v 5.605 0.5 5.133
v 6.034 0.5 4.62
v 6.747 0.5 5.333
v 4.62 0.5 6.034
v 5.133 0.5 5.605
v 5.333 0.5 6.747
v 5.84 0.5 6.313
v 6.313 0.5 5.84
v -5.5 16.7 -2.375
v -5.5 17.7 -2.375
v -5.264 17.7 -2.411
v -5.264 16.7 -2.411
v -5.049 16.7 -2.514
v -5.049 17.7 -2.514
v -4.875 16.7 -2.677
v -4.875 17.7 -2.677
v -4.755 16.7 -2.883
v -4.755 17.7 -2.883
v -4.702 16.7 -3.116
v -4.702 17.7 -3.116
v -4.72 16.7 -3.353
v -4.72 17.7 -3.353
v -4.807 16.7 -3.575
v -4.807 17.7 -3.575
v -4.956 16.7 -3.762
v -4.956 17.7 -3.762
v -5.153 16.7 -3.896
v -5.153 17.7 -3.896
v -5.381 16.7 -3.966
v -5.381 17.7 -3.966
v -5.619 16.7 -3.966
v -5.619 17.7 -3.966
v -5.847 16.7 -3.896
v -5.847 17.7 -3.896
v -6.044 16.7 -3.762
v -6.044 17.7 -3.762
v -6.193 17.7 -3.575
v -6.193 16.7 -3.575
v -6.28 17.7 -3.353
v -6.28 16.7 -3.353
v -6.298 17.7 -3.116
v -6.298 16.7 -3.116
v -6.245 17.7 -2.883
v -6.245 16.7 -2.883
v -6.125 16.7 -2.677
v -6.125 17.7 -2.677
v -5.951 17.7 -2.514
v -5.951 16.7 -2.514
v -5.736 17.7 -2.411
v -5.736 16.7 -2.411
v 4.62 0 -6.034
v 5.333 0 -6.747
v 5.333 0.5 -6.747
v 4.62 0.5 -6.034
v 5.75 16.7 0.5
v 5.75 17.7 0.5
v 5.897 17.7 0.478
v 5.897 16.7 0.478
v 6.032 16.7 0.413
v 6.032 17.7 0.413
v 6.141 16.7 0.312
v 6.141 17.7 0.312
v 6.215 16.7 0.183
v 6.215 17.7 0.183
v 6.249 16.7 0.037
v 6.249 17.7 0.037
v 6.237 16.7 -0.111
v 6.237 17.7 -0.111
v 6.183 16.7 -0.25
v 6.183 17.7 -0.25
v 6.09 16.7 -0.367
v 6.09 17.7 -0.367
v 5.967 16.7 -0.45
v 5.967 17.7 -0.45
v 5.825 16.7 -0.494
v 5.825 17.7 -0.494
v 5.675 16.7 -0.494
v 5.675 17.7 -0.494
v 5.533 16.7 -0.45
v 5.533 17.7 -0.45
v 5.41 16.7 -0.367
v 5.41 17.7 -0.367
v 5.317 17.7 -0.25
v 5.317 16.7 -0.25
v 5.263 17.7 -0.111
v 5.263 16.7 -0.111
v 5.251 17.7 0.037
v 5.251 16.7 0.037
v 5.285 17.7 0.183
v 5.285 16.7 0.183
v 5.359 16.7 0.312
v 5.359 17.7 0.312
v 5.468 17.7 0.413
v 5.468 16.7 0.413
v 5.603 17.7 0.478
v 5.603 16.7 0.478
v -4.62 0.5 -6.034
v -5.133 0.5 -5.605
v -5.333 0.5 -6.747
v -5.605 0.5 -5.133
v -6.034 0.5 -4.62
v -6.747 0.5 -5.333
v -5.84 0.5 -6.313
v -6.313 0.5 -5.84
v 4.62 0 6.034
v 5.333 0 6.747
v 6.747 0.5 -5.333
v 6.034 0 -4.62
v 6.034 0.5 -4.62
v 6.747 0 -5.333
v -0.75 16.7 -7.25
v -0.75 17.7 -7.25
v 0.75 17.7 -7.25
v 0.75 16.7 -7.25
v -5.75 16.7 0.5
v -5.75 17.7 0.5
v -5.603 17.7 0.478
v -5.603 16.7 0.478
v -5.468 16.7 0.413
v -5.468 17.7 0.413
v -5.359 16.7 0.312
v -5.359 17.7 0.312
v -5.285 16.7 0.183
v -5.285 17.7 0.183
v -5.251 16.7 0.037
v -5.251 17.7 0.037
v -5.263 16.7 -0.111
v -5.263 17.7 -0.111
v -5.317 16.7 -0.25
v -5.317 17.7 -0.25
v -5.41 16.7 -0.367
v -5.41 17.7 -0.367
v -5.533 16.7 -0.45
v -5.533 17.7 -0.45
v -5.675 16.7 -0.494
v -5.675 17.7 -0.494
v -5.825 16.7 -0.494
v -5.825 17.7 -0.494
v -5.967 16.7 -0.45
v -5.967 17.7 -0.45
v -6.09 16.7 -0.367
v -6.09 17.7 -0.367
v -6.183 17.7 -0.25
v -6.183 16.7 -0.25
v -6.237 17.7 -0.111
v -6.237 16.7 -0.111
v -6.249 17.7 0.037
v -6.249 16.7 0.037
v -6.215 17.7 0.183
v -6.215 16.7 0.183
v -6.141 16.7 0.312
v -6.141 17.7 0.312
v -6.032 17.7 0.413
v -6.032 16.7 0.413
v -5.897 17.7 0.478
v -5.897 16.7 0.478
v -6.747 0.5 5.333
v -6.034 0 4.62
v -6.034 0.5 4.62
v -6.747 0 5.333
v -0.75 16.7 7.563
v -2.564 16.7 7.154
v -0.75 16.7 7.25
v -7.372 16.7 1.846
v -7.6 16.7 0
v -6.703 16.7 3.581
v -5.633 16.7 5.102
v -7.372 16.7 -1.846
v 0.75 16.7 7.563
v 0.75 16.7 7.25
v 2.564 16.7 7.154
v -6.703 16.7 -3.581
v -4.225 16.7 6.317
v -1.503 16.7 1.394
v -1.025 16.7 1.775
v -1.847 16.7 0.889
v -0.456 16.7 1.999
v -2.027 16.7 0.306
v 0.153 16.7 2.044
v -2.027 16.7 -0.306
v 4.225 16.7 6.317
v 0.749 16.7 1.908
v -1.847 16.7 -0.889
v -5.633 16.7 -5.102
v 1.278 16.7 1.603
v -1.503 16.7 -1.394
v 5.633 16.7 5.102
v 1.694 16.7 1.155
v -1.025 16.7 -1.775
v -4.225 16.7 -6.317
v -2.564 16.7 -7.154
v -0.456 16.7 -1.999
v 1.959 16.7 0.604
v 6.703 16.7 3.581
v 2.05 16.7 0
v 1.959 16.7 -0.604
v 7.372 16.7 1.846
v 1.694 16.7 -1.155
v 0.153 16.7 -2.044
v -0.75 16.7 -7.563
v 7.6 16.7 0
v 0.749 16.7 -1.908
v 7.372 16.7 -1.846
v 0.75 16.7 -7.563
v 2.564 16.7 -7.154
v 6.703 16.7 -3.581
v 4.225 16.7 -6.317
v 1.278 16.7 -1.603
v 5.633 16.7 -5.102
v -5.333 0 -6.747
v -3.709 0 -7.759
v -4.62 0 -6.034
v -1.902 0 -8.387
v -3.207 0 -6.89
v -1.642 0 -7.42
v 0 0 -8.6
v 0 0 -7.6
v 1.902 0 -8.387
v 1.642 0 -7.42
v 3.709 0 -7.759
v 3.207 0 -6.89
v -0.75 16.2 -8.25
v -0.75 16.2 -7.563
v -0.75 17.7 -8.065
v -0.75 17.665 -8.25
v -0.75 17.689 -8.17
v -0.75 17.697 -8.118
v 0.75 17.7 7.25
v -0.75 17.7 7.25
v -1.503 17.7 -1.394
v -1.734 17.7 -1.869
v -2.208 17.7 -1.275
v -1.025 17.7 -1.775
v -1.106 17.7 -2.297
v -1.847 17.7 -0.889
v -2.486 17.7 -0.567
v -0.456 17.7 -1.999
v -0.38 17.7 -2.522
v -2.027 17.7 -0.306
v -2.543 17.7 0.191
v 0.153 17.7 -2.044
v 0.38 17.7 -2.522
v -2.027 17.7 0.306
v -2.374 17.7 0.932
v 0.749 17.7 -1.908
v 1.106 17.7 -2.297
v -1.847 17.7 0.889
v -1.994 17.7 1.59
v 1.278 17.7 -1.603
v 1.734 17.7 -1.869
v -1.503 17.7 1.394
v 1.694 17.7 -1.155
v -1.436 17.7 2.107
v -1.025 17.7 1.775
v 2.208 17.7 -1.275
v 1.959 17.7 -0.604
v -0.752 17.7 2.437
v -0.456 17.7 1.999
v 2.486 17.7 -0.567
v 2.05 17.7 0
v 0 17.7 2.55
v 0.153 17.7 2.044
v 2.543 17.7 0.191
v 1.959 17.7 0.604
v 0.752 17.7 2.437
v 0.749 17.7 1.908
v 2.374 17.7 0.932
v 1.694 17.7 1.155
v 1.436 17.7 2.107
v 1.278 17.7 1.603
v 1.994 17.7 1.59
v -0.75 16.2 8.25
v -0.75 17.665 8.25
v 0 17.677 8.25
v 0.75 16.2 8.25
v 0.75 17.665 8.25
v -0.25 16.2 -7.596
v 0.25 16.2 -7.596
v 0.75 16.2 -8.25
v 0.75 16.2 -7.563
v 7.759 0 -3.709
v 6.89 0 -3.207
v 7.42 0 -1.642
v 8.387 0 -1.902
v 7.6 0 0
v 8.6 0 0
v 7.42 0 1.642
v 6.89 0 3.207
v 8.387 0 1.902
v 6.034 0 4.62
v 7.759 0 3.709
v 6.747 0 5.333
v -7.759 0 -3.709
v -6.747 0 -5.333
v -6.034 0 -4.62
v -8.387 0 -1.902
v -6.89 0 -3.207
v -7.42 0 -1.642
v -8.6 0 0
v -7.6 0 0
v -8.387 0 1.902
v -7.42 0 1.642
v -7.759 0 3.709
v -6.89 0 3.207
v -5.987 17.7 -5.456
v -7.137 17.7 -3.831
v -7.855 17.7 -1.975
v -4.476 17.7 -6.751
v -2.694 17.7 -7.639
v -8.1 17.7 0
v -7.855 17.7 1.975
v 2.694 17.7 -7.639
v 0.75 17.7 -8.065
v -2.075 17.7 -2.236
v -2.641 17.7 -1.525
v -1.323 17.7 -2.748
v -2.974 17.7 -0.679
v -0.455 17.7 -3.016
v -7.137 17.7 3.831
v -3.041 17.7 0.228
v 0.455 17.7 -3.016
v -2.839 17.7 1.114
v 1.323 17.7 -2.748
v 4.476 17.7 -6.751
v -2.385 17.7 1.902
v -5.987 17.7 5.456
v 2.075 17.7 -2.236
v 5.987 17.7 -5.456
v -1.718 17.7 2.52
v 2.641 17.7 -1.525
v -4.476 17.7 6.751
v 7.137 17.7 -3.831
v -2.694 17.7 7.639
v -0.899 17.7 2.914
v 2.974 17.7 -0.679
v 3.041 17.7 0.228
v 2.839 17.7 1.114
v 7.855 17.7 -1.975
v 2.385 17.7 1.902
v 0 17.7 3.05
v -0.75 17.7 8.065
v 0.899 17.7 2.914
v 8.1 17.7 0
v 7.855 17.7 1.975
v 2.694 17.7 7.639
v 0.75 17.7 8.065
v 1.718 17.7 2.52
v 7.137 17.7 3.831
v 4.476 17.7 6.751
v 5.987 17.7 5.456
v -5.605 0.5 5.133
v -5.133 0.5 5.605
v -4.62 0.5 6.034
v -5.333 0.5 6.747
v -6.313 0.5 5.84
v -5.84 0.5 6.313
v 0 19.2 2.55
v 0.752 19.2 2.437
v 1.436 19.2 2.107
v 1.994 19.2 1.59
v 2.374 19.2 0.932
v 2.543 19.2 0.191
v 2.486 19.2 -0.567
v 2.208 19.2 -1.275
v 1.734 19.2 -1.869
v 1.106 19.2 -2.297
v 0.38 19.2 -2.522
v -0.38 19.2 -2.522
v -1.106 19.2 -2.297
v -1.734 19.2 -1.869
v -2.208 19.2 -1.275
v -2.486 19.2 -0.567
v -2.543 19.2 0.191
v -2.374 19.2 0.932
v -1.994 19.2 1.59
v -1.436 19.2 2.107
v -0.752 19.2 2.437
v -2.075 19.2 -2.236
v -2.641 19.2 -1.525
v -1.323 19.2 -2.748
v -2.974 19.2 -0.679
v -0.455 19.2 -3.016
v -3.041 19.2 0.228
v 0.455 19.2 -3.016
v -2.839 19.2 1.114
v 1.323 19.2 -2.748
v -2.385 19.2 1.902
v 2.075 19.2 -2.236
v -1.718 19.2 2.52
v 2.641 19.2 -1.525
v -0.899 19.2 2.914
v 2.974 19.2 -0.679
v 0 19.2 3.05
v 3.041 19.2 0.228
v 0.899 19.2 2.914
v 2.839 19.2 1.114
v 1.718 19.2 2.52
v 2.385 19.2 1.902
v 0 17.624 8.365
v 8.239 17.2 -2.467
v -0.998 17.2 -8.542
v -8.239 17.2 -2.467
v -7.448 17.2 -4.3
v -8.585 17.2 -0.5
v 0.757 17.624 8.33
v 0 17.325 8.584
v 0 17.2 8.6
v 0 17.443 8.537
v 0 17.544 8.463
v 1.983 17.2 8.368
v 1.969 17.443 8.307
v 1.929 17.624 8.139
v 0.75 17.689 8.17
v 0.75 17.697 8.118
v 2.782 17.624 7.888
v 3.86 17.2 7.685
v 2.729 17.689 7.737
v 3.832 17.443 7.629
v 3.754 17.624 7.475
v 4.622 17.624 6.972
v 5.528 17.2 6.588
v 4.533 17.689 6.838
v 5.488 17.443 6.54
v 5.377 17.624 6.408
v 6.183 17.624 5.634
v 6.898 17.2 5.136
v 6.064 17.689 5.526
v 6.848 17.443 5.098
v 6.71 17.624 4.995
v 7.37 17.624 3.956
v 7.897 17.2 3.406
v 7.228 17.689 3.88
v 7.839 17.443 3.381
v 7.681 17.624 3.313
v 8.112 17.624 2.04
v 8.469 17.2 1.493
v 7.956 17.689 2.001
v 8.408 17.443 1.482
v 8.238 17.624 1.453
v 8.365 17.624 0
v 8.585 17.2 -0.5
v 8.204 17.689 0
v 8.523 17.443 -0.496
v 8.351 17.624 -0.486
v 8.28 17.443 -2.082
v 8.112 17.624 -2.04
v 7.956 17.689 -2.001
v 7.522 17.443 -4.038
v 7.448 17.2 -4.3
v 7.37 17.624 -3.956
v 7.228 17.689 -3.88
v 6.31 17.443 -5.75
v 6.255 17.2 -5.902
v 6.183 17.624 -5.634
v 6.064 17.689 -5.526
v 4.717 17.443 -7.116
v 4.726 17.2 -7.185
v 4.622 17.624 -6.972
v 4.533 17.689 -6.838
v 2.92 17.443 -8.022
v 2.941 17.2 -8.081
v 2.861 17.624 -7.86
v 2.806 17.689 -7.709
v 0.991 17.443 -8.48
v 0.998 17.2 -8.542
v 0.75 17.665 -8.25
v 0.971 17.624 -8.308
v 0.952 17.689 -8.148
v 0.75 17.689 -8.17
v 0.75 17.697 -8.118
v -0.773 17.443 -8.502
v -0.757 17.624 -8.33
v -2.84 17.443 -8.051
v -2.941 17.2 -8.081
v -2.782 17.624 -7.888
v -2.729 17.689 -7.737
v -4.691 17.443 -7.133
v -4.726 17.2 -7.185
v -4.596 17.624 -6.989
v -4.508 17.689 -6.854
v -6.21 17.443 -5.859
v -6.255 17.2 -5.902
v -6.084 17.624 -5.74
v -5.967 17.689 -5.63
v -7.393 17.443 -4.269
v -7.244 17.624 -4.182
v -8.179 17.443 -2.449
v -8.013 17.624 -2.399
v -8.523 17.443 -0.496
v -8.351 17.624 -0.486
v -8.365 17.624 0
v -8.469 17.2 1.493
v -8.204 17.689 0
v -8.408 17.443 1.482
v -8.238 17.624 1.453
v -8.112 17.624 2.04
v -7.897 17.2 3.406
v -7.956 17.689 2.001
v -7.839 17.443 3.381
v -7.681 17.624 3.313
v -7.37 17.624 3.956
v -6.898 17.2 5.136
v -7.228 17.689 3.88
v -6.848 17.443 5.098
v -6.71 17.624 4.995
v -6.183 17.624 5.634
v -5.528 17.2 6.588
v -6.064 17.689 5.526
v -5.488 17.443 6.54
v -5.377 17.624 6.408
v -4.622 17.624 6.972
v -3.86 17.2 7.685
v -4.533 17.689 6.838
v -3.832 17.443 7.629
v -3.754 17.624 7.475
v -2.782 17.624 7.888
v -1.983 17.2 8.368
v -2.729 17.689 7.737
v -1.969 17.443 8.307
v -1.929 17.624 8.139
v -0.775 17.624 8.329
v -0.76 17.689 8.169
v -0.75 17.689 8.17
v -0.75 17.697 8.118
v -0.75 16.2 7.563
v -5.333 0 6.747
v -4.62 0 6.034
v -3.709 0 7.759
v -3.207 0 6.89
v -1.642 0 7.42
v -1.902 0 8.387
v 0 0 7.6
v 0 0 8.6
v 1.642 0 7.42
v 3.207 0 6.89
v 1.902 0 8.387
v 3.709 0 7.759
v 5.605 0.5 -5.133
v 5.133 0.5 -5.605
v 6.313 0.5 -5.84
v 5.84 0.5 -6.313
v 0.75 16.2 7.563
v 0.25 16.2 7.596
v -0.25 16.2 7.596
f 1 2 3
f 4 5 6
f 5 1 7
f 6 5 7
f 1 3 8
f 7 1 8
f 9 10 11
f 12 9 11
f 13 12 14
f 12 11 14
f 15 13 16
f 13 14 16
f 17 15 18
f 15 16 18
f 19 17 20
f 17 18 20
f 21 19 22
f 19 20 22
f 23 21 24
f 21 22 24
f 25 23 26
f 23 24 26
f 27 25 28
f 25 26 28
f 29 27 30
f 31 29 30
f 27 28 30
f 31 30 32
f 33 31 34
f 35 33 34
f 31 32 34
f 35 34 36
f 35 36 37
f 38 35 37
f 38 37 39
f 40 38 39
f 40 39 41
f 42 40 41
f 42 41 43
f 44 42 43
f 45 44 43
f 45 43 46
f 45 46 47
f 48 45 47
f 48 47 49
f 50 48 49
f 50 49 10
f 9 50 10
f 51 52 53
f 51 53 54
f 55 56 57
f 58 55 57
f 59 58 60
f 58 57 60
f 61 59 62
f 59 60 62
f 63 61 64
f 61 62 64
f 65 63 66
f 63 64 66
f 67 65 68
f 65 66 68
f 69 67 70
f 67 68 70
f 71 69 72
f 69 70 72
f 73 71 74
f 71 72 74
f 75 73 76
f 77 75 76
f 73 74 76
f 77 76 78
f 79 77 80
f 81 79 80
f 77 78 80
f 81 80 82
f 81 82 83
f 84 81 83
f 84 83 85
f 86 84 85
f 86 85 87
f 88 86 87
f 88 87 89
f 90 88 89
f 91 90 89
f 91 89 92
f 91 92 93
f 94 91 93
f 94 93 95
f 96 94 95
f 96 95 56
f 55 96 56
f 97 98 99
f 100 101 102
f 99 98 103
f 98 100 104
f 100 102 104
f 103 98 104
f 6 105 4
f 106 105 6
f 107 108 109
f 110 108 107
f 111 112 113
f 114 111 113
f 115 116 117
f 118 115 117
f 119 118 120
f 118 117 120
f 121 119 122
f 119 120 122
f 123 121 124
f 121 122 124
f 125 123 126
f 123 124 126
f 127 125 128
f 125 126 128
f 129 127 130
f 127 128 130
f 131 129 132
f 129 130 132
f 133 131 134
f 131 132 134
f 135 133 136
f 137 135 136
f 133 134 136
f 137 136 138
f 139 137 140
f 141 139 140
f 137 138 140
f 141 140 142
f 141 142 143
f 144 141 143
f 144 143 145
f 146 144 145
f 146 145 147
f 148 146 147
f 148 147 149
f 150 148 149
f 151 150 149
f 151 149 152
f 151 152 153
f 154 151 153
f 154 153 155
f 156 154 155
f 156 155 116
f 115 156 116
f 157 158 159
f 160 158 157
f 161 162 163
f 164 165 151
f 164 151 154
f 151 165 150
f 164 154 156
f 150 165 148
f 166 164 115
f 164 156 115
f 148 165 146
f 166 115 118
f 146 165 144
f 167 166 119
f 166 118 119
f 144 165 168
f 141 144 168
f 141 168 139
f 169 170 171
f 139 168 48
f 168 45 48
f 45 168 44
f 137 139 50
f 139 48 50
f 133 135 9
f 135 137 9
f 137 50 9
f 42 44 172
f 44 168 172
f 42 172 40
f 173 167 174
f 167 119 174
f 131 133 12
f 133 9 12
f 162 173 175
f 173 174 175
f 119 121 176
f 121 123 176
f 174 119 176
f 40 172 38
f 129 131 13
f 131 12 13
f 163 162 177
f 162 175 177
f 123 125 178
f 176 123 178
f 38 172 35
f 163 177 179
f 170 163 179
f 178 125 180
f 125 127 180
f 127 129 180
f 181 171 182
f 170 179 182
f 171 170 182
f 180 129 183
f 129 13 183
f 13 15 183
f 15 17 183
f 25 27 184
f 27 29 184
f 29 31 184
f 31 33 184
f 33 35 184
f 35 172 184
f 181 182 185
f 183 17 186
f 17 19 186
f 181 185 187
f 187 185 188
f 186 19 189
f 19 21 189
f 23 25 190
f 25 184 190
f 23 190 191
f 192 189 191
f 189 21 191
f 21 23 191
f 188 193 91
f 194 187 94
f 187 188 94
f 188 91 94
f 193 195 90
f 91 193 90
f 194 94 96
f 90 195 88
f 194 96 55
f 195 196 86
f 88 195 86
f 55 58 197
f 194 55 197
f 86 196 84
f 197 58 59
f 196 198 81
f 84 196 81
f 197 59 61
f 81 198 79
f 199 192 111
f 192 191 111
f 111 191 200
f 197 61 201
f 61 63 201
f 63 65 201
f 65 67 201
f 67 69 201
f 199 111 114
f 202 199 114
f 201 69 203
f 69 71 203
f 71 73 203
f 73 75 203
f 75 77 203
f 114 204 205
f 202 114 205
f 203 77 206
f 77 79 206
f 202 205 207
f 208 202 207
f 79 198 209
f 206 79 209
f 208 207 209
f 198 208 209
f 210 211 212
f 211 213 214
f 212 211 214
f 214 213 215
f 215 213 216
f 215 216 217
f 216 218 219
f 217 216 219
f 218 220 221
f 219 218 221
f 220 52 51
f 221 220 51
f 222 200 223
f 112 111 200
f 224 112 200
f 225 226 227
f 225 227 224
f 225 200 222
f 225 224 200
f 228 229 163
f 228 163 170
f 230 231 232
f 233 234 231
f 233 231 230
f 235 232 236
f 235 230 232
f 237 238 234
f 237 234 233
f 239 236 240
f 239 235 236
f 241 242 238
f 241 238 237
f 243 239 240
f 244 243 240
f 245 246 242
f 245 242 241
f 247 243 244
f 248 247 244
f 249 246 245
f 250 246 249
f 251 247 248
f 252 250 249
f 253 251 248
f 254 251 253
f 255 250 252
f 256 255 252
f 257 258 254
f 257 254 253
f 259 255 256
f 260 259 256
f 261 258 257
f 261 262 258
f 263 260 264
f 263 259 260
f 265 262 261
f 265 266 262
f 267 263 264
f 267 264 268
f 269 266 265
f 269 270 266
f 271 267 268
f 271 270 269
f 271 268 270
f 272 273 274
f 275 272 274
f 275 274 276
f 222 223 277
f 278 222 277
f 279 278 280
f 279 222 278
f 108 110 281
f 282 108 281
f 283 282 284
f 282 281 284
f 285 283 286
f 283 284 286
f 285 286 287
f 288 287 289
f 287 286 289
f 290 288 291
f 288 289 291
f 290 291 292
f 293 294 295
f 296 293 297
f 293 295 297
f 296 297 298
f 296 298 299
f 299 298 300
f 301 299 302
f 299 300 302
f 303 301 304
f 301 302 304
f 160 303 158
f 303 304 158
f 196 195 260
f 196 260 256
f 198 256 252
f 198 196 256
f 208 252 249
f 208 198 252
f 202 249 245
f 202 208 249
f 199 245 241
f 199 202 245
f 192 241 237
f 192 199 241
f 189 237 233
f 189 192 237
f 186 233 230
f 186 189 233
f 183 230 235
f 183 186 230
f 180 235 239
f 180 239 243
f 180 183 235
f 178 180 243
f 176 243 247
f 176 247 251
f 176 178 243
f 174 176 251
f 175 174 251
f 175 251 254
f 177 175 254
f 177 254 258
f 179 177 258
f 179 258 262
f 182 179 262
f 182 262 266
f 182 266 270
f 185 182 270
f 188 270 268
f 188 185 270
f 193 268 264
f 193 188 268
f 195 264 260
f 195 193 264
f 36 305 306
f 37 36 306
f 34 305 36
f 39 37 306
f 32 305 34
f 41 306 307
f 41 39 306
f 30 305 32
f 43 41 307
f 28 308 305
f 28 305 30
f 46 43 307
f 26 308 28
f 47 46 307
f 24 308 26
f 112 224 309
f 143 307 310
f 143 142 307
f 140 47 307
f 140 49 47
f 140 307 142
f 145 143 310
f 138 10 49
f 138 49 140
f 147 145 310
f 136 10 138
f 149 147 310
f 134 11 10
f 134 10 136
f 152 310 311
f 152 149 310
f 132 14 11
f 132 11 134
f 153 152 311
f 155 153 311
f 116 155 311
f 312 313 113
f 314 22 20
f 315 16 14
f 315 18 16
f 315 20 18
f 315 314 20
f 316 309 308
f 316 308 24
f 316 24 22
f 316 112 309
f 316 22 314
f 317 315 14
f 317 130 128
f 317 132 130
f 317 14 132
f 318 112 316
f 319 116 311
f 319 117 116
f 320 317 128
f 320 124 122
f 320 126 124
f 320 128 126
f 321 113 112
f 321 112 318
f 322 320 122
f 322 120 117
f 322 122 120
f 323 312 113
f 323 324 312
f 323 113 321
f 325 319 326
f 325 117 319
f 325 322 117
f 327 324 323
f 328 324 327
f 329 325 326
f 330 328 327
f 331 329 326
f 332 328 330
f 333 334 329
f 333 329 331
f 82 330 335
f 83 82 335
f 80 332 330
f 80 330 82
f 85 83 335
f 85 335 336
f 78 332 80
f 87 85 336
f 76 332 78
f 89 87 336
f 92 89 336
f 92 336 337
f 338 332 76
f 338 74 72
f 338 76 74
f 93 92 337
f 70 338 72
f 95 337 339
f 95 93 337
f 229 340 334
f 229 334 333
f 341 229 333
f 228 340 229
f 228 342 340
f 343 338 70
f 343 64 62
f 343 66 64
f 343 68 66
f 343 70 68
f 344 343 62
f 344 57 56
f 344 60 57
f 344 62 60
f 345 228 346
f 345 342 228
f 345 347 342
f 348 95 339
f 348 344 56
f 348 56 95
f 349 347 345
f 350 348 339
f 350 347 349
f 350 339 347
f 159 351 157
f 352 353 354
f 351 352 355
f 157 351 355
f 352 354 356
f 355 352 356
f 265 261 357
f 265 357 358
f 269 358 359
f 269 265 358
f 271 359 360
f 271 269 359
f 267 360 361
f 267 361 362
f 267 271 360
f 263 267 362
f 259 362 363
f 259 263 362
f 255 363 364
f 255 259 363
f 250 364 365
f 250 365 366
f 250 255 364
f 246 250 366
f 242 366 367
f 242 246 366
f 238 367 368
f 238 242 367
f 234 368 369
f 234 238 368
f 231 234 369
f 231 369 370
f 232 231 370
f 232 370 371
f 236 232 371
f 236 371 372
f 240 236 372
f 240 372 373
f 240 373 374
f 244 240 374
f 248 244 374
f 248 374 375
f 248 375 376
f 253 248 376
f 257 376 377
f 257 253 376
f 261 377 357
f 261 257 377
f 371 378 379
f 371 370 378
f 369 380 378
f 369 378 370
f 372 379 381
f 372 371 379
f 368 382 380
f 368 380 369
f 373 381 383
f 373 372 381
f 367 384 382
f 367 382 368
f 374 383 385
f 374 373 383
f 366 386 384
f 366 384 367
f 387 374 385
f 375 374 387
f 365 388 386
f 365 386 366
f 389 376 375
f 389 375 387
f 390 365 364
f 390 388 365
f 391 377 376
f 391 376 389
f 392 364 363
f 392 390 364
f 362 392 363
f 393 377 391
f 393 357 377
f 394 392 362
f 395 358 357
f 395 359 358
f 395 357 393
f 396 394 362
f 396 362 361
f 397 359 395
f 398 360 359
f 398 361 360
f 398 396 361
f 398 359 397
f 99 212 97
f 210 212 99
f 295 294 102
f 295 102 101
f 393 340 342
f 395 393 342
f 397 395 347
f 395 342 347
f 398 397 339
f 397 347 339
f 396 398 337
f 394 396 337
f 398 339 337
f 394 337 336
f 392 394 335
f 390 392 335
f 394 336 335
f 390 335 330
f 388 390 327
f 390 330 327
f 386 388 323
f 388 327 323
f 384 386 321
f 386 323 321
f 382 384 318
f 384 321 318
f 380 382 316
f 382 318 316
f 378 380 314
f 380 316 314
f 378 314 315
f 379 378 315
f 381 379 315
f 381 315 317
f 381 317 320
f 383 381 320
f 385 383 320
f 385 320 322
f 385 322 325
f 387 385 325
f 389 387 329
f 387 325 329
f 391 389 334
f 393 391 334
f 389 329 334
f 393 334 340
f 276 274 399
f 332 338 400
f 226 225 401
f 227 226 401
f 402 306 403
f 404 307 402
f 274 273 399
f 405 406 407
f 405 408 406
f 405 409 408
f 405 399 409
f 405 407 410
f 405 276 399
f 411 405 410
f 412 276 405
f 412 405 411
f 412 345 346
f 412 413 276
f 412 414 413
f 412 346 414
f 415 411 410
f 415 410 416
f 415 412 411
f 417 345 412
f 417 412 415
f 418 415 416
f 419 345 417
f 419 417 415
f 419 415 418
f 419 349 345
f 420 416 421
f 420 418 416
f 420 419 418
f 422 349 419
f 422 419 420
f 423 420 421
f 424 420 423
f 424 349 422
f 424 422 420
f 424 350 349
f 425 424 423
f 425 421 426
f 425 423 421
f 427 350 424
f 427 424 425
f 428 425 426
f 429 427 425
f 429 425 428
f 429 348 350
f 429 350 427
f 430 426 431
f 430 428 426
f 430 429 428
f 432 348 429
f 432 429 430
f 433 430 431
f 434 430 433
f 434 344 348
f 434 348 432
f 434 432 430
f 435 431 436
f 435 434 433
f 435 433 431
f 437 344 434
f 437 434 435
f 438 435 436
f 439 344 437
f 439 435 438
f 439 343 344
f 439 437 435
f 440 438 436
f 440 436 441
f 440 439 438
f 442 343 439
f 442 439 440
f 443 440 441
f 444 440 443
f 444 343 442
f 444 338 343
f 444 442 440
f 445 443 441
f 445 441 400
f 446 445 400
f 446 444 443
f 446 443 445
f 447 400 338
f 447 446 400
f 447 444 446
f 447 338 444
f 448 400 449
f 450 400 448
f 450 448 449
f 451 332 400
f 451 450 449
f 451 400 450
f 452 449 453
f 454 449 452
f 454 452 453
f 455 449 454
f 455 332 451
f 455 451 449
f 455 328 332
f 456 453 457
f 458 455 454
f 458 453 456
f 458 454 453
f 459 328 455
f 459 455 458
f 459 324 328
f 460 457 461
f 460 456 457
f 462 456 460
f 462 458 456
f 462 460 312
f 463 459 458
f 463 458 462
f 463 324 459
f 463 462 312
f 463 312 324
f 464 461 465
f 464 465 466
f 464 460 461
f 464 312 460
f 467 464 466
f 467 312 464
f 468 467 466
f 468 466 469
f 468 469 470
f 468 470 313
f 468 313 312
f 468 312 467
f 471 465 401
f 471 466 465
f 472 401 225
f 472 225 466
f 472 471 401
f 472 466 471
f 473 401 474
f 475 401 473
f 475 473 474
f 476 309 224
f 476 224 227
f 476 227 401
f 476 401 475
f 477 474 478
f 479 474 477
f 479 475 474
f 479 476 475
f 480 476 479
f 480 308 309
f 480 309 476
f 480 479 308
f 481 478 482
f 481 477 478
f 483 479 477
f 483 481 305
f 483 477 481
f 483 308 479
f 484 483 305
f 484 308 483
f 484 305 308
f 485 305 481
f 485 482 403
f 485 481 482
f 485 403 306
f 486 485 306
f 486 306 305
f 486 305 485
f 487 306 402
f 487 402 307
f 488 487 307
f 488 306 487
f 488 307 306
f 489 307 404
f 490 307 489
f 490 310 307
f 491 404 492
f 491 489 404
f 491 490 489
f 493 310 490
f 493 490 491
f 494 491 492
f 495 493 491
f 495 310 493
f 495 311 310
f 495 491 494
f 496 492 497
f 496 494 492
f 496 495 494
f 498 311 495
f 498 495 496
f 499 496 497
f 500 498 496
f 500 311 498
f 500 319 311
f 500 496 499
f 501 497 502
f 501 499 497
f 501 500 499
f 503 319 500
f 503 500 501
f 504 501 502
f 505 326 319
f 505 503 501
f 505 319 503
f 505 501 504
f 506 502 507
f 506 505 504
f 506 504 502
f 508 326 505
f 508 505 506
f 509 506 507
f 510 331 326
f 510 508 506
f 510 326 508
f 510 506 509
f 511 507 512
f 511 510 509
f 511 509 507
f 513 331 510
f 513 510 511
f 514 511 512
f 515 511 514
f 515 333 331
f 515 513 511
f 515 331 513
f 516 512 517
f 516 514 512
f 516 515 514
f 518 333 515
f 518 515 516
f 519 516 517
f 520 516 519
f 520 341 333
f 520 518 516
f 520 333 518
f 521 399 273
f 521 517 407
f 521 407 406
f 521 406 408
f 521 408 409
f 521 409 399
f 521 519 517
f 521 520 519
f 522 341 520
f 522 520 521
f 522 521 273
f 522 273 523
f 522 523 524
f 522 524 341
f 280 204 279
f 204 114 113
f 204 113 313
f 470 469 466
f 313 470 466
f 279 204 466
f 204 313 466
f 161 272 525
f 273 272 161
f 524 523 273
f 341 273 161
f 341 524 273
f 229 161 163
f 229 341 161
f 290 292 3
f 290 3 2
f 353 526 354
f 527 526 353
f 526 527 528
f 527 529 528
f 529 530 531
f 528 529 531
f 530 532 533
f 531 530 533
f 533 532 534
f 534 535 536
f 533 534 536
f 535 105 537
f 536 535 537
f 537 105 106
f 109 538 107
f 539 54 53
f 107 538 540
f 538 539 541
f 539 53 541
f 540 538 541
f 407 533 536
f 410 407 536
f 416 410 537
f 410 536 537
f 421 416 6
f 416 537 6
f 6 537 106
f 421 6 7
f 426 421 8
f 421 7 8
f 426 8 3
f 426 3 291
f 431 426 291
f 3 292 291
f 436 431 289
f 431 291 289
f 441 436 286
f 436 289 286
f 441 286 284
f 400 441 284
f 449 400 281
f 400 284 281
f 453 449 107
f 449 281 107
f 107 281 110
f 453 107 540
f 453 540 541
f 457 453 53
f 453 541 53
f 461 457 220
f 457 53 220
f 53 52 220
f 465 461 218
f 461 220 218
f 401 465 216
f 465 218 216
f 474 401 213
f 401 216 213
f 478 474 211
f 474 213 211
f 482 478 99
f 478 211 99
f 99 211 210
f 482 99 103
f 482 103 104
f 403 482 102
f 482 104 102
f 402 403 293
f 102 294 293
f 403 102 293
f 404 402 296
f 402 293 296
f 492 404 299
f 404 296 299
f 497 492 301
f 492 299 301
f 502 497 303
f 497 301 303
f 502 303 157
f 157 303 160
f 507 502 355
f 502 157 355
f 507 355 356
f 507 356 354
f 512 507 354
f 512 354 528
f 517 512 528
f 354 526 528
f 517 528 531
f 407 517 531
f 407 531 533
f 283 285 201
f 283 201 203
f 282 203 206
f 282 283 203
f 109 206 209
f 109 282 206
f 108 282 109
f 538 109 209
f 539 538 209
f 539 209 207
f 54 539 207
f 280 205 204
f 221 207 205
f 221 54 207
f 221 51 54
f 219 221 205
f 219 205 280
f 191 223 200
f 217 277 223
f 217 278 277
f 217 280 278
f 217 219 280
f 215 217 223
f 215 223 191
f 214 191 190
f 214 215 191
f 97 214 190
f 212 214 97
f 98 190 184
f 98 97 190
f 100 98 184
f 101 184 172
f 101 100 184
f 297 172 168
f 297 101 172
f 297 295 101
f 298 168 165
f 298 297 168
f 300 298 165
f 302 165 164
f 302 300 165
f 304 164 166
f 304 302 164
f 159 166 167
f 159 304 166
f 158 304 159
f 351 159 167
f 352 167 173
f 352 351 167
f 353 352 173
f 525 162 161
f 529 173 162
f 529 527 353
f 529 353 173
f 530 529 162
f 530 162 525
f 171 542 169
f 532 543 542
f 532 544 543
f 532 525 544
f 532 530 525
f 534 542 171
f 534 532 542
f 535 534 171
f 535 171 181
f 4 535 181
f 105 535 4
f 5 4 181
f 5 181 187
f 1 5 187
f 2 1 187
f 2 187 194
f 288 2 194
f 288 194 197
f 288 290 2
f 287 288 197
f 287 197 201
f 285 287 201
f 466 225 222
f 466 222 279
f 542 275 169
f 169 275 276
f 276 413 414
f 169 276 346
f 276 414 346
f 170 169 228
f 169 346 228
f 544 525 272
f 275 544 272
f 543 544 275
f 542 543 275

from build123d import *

# Parameters (mm, degrees)
SKETCH_1_R               = 8.6
EXTRUDE_1_DEPTH          = 17.7
SKETCH_2_R               = 3.05
SKETCH_2_R_2             = 2.55
EXTRUDE_2_DEPTH          = 1.5
SHELL_4_OUTLINE_R        = 7.6
SHELL_4_DEPTH            = 16.7
SHELL_START              = 16.7
SHELL_4_2_OUTLINE_R      = 2.05
SHELL_4_2_DEPTH          = 1
SKETCH_5_R               = 0.8
SKETCH_5_R_2             = 0.5
SKETCH_5_W               = 1.5
SKETCH_5_H               = 1
CUT_EXTRUDE_5_DEPTH      = 1.5
CUT_EXTRUDE_6_DEPTH      = 0.5
PATTERN_CIRCULAR_1_COUNT = 4
FILLET_1_R               = 0.5


# Read off the part's stored shape, not the designer's step: 薄殼4
with BuildPart() as part:
    # 草圖1 → 伸長1 (new body)
    with BuildSketch(Plane(origin=(0, 0, 0), x_dir=(1, 0, 0), z_dir=(0, 1, 0))):
        with Locations(Location((0, 0, 0), (0, 0, 270))):
            Circle(SKETCH_1_R)
    extrude(amount=EXTRUDE_1_DEPTH)

    # 草圖2 → 伸長2 (add)
    with BuildSketch(Plane(origin=(0, 17.7, 0), x_dir=(1, 0, 0), z_dir=(0, 1, 0))):
        with Locations(Location((0, 0, 0), (0, 0, 270))):
            Circle(SKETCH_2_R)
        with Locations(Location((0, 0, 0), (0, 0, 270))):
            Circle(SKETCH_2_R_2, mode=Mode.SUBTRACT)
    extrude(amount=EXTRUDE_2_DEPTH)

    # 薄殼4 outline → 薄殼4 (cut)
    with BuildSketch(Plane(origin=(0, 0, 0), x_dir=(1, 0, 0), z_dir=(0, 1, 0))):
        Circle(SHELL_4_OUTLINE_R)
    extrude(amount=SHELL_4_DEPTH, mode=Mode.SUBTRACT)

    # Shell 4 2 outline → Shell 4 2 (cut)
    with BuildSketch(Plane(origin=(0, 0, 0), x_dir=(1, 0, 0), z_dir=(0, 1, 0)).offset(SHELL_START)):
        Circle(SHELL_4_2_OUTLINE_R)
    extrude(amount=SHELL_4_2_DEPTH, mode=Mode.SUBTRACT)

    # 草圖5 → 伸長5 (cut)
    with BuildSketch(Plane(origin=(0, 17.7, 0), x_dir=(1, 0, 0), z_dir=(0, 1, 0))):
        with Locations(Location((-5.5, 3.175426481, 0), (0, 0, 270))):
            Circle(SKETCH_5_R)
        with Locations(Location((-5.75, 0, 0), (0, 0, 270))):
            Circle(SKETCH_5_R_2)
        with Locations(Location((5.75, 0, 0), (0, 0, 270))):
            Circle(SKETCH_5_R_2)
        with Locations((0, 7.75)):
            Rectangle(SKETCH_5_W, SKETCH_5_H)
        with Locations((0, -7.75)):
            Rectangle(SKETCH_5_W, SKETCH_5_H)
    extrude(amount=-CUT_EXTRUDE_5_DEPTH, mode=Mode.SUBTRACT)

    # 草圖7 → 伸長6 (cut)
    with BuildSketch(Plane.XZ):
        Polygon((-5.762920267, 4.348706704), (-6.965001795, 5.550788232), (-5.550788232, 6.965001795), (-4.348706704, 5.762920267), align=None)
    cut_extrude_6 = extrude(amount=-CUT_EXTRUDE_6_DEPTH, mode=Mode.SUBTRACT)

    # 環狀複製排列1: 伸長6 ×4 about axis
    pattern_circular_1_axis = Axis((0, 0, 0), (0, 1, 0))
    for i in range(1, PATTERN_CIRCULAR_1_COUNT):
        add(cut_extrude_6.rotate(pattern_circular_1_axis, i * 360 / PATTERN_CIRCULAR_1_COUNT), mode=Mode.SUBTRACT)

    # 圓角1
    # the kernel refuses this fillet: 0.5 mm, written as the material it takes off along each edge
    with BuildSketch(Plane(origin=(0, 17.7, 0), x_dir=(0, 0, 1), z_dir=(-1, 0, 0))) as fillet_1_piece_1:
        with BuildLine():
            CenterArc((8.6 - FILLET_1_R, -FILLET_1_R), FILLET_1_R, 0, 90)
            Line((8.6 - FILLET_1_R, 0), (8.6, 0))
            Line((8.6, 0), (8.6, -FILLET_1_R))
        make_face()
    revolve(axis=Axis((0, 17.7, 0), (0, 1, 0)), mode=Mode.SUBTRACT)


solid = part.part
